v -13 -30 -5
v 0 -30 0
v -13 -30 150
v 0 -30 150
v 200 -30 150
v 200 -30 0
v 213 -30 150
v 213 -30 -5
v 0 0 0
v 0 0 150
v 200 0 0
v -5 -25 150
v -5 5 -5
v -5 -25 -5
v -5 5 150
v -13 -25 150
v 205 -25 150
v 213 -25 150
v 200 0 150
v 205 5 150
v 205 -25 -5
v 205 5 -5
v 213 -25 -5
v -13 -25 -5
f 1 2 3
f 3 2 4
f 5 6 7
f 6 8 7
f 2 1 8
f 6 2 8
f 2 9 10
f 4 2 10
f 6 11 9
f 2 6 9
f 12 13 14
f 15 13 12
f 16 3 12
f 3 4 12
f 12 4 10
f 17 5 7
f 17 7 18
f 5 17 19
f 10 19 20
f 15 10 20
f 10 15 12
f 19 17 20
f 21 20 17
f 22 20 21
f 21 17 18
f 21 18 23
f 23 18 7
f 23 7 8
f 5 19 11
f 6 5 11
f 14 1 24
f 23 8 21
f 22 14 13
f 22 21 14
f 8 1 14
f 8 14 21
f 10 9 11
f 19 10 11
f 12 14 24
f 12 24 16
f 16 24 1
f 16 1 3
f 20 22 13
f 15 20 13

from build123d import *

# Parameters (mm, degrees)
SKETCH1_W           = 200
SKETCH1_H           = 150
BOSS_EXTRUDE1_DEPTH = 5
BOSS_EXTRUDE2_DEPTH = 35
SKETCH4_W           = 155
SKETCH4_H           = 5
BOSS_EXTRUDE3_DEPTH = 8
SKETCH5_W           = 155
SKETCH5_H           = 5
BOSS_EXTRUDE4_DEPTH = 8


with BuildPart() as part:
    # Sketch1 → Boss-Extrude1 (new body)
    with BuildSketch(Plane(origin=(0, 0, 0), x_dir=(1, 0, 0), z_dir=(0, 1, 0))):
        with Locations((100, -75)):
            Rectangle(SKETCH1_W, SKETCH1_H)
    extrude(amount=BOSS_EXTRUDE1_DEPTH)

    # Sketch2 → Boss-Extrude2 (add)
    with BuildSketch(Plane(origin=(0, 5, 0), x_dir=(1, 0, 0), z_dir=(0, 1, 0))):
        Polygon((0, -150), (-5, -150), (-5, 0), (-5, 5), (205, 5), (205, 0), (205, -150), (200, -150), (200, 0), (0, 0), align=None)
    extrude(amount=-BOSS_EXTRUDE2_DEPTH)

    # Sketch4 → Boss-Extrude3 (add)
    with BuildSketch(Plane(origin=(205, 0, 0), x_dir=(0, 0, -1), z_dir=(1, 0, 0))):
        with Locations((-72.5, -27.5)):
            Rectangle(SKETCH4_W, SKETCH4_H)
    extrude(amount=BOSS_EXTRUDE3_DEPTH)

    # Sketch5 → Boss-Extrude4 (add)
    with BuildSketch(Plane.ZY.offset(5)):
        with Locations((72.5, -27.5)):
            Rectangle(SKETCH5_W, SKETCH5_H)
    extrude(amount=BOSS_EXTRUDE4_DEPTH)


solid = part.part
